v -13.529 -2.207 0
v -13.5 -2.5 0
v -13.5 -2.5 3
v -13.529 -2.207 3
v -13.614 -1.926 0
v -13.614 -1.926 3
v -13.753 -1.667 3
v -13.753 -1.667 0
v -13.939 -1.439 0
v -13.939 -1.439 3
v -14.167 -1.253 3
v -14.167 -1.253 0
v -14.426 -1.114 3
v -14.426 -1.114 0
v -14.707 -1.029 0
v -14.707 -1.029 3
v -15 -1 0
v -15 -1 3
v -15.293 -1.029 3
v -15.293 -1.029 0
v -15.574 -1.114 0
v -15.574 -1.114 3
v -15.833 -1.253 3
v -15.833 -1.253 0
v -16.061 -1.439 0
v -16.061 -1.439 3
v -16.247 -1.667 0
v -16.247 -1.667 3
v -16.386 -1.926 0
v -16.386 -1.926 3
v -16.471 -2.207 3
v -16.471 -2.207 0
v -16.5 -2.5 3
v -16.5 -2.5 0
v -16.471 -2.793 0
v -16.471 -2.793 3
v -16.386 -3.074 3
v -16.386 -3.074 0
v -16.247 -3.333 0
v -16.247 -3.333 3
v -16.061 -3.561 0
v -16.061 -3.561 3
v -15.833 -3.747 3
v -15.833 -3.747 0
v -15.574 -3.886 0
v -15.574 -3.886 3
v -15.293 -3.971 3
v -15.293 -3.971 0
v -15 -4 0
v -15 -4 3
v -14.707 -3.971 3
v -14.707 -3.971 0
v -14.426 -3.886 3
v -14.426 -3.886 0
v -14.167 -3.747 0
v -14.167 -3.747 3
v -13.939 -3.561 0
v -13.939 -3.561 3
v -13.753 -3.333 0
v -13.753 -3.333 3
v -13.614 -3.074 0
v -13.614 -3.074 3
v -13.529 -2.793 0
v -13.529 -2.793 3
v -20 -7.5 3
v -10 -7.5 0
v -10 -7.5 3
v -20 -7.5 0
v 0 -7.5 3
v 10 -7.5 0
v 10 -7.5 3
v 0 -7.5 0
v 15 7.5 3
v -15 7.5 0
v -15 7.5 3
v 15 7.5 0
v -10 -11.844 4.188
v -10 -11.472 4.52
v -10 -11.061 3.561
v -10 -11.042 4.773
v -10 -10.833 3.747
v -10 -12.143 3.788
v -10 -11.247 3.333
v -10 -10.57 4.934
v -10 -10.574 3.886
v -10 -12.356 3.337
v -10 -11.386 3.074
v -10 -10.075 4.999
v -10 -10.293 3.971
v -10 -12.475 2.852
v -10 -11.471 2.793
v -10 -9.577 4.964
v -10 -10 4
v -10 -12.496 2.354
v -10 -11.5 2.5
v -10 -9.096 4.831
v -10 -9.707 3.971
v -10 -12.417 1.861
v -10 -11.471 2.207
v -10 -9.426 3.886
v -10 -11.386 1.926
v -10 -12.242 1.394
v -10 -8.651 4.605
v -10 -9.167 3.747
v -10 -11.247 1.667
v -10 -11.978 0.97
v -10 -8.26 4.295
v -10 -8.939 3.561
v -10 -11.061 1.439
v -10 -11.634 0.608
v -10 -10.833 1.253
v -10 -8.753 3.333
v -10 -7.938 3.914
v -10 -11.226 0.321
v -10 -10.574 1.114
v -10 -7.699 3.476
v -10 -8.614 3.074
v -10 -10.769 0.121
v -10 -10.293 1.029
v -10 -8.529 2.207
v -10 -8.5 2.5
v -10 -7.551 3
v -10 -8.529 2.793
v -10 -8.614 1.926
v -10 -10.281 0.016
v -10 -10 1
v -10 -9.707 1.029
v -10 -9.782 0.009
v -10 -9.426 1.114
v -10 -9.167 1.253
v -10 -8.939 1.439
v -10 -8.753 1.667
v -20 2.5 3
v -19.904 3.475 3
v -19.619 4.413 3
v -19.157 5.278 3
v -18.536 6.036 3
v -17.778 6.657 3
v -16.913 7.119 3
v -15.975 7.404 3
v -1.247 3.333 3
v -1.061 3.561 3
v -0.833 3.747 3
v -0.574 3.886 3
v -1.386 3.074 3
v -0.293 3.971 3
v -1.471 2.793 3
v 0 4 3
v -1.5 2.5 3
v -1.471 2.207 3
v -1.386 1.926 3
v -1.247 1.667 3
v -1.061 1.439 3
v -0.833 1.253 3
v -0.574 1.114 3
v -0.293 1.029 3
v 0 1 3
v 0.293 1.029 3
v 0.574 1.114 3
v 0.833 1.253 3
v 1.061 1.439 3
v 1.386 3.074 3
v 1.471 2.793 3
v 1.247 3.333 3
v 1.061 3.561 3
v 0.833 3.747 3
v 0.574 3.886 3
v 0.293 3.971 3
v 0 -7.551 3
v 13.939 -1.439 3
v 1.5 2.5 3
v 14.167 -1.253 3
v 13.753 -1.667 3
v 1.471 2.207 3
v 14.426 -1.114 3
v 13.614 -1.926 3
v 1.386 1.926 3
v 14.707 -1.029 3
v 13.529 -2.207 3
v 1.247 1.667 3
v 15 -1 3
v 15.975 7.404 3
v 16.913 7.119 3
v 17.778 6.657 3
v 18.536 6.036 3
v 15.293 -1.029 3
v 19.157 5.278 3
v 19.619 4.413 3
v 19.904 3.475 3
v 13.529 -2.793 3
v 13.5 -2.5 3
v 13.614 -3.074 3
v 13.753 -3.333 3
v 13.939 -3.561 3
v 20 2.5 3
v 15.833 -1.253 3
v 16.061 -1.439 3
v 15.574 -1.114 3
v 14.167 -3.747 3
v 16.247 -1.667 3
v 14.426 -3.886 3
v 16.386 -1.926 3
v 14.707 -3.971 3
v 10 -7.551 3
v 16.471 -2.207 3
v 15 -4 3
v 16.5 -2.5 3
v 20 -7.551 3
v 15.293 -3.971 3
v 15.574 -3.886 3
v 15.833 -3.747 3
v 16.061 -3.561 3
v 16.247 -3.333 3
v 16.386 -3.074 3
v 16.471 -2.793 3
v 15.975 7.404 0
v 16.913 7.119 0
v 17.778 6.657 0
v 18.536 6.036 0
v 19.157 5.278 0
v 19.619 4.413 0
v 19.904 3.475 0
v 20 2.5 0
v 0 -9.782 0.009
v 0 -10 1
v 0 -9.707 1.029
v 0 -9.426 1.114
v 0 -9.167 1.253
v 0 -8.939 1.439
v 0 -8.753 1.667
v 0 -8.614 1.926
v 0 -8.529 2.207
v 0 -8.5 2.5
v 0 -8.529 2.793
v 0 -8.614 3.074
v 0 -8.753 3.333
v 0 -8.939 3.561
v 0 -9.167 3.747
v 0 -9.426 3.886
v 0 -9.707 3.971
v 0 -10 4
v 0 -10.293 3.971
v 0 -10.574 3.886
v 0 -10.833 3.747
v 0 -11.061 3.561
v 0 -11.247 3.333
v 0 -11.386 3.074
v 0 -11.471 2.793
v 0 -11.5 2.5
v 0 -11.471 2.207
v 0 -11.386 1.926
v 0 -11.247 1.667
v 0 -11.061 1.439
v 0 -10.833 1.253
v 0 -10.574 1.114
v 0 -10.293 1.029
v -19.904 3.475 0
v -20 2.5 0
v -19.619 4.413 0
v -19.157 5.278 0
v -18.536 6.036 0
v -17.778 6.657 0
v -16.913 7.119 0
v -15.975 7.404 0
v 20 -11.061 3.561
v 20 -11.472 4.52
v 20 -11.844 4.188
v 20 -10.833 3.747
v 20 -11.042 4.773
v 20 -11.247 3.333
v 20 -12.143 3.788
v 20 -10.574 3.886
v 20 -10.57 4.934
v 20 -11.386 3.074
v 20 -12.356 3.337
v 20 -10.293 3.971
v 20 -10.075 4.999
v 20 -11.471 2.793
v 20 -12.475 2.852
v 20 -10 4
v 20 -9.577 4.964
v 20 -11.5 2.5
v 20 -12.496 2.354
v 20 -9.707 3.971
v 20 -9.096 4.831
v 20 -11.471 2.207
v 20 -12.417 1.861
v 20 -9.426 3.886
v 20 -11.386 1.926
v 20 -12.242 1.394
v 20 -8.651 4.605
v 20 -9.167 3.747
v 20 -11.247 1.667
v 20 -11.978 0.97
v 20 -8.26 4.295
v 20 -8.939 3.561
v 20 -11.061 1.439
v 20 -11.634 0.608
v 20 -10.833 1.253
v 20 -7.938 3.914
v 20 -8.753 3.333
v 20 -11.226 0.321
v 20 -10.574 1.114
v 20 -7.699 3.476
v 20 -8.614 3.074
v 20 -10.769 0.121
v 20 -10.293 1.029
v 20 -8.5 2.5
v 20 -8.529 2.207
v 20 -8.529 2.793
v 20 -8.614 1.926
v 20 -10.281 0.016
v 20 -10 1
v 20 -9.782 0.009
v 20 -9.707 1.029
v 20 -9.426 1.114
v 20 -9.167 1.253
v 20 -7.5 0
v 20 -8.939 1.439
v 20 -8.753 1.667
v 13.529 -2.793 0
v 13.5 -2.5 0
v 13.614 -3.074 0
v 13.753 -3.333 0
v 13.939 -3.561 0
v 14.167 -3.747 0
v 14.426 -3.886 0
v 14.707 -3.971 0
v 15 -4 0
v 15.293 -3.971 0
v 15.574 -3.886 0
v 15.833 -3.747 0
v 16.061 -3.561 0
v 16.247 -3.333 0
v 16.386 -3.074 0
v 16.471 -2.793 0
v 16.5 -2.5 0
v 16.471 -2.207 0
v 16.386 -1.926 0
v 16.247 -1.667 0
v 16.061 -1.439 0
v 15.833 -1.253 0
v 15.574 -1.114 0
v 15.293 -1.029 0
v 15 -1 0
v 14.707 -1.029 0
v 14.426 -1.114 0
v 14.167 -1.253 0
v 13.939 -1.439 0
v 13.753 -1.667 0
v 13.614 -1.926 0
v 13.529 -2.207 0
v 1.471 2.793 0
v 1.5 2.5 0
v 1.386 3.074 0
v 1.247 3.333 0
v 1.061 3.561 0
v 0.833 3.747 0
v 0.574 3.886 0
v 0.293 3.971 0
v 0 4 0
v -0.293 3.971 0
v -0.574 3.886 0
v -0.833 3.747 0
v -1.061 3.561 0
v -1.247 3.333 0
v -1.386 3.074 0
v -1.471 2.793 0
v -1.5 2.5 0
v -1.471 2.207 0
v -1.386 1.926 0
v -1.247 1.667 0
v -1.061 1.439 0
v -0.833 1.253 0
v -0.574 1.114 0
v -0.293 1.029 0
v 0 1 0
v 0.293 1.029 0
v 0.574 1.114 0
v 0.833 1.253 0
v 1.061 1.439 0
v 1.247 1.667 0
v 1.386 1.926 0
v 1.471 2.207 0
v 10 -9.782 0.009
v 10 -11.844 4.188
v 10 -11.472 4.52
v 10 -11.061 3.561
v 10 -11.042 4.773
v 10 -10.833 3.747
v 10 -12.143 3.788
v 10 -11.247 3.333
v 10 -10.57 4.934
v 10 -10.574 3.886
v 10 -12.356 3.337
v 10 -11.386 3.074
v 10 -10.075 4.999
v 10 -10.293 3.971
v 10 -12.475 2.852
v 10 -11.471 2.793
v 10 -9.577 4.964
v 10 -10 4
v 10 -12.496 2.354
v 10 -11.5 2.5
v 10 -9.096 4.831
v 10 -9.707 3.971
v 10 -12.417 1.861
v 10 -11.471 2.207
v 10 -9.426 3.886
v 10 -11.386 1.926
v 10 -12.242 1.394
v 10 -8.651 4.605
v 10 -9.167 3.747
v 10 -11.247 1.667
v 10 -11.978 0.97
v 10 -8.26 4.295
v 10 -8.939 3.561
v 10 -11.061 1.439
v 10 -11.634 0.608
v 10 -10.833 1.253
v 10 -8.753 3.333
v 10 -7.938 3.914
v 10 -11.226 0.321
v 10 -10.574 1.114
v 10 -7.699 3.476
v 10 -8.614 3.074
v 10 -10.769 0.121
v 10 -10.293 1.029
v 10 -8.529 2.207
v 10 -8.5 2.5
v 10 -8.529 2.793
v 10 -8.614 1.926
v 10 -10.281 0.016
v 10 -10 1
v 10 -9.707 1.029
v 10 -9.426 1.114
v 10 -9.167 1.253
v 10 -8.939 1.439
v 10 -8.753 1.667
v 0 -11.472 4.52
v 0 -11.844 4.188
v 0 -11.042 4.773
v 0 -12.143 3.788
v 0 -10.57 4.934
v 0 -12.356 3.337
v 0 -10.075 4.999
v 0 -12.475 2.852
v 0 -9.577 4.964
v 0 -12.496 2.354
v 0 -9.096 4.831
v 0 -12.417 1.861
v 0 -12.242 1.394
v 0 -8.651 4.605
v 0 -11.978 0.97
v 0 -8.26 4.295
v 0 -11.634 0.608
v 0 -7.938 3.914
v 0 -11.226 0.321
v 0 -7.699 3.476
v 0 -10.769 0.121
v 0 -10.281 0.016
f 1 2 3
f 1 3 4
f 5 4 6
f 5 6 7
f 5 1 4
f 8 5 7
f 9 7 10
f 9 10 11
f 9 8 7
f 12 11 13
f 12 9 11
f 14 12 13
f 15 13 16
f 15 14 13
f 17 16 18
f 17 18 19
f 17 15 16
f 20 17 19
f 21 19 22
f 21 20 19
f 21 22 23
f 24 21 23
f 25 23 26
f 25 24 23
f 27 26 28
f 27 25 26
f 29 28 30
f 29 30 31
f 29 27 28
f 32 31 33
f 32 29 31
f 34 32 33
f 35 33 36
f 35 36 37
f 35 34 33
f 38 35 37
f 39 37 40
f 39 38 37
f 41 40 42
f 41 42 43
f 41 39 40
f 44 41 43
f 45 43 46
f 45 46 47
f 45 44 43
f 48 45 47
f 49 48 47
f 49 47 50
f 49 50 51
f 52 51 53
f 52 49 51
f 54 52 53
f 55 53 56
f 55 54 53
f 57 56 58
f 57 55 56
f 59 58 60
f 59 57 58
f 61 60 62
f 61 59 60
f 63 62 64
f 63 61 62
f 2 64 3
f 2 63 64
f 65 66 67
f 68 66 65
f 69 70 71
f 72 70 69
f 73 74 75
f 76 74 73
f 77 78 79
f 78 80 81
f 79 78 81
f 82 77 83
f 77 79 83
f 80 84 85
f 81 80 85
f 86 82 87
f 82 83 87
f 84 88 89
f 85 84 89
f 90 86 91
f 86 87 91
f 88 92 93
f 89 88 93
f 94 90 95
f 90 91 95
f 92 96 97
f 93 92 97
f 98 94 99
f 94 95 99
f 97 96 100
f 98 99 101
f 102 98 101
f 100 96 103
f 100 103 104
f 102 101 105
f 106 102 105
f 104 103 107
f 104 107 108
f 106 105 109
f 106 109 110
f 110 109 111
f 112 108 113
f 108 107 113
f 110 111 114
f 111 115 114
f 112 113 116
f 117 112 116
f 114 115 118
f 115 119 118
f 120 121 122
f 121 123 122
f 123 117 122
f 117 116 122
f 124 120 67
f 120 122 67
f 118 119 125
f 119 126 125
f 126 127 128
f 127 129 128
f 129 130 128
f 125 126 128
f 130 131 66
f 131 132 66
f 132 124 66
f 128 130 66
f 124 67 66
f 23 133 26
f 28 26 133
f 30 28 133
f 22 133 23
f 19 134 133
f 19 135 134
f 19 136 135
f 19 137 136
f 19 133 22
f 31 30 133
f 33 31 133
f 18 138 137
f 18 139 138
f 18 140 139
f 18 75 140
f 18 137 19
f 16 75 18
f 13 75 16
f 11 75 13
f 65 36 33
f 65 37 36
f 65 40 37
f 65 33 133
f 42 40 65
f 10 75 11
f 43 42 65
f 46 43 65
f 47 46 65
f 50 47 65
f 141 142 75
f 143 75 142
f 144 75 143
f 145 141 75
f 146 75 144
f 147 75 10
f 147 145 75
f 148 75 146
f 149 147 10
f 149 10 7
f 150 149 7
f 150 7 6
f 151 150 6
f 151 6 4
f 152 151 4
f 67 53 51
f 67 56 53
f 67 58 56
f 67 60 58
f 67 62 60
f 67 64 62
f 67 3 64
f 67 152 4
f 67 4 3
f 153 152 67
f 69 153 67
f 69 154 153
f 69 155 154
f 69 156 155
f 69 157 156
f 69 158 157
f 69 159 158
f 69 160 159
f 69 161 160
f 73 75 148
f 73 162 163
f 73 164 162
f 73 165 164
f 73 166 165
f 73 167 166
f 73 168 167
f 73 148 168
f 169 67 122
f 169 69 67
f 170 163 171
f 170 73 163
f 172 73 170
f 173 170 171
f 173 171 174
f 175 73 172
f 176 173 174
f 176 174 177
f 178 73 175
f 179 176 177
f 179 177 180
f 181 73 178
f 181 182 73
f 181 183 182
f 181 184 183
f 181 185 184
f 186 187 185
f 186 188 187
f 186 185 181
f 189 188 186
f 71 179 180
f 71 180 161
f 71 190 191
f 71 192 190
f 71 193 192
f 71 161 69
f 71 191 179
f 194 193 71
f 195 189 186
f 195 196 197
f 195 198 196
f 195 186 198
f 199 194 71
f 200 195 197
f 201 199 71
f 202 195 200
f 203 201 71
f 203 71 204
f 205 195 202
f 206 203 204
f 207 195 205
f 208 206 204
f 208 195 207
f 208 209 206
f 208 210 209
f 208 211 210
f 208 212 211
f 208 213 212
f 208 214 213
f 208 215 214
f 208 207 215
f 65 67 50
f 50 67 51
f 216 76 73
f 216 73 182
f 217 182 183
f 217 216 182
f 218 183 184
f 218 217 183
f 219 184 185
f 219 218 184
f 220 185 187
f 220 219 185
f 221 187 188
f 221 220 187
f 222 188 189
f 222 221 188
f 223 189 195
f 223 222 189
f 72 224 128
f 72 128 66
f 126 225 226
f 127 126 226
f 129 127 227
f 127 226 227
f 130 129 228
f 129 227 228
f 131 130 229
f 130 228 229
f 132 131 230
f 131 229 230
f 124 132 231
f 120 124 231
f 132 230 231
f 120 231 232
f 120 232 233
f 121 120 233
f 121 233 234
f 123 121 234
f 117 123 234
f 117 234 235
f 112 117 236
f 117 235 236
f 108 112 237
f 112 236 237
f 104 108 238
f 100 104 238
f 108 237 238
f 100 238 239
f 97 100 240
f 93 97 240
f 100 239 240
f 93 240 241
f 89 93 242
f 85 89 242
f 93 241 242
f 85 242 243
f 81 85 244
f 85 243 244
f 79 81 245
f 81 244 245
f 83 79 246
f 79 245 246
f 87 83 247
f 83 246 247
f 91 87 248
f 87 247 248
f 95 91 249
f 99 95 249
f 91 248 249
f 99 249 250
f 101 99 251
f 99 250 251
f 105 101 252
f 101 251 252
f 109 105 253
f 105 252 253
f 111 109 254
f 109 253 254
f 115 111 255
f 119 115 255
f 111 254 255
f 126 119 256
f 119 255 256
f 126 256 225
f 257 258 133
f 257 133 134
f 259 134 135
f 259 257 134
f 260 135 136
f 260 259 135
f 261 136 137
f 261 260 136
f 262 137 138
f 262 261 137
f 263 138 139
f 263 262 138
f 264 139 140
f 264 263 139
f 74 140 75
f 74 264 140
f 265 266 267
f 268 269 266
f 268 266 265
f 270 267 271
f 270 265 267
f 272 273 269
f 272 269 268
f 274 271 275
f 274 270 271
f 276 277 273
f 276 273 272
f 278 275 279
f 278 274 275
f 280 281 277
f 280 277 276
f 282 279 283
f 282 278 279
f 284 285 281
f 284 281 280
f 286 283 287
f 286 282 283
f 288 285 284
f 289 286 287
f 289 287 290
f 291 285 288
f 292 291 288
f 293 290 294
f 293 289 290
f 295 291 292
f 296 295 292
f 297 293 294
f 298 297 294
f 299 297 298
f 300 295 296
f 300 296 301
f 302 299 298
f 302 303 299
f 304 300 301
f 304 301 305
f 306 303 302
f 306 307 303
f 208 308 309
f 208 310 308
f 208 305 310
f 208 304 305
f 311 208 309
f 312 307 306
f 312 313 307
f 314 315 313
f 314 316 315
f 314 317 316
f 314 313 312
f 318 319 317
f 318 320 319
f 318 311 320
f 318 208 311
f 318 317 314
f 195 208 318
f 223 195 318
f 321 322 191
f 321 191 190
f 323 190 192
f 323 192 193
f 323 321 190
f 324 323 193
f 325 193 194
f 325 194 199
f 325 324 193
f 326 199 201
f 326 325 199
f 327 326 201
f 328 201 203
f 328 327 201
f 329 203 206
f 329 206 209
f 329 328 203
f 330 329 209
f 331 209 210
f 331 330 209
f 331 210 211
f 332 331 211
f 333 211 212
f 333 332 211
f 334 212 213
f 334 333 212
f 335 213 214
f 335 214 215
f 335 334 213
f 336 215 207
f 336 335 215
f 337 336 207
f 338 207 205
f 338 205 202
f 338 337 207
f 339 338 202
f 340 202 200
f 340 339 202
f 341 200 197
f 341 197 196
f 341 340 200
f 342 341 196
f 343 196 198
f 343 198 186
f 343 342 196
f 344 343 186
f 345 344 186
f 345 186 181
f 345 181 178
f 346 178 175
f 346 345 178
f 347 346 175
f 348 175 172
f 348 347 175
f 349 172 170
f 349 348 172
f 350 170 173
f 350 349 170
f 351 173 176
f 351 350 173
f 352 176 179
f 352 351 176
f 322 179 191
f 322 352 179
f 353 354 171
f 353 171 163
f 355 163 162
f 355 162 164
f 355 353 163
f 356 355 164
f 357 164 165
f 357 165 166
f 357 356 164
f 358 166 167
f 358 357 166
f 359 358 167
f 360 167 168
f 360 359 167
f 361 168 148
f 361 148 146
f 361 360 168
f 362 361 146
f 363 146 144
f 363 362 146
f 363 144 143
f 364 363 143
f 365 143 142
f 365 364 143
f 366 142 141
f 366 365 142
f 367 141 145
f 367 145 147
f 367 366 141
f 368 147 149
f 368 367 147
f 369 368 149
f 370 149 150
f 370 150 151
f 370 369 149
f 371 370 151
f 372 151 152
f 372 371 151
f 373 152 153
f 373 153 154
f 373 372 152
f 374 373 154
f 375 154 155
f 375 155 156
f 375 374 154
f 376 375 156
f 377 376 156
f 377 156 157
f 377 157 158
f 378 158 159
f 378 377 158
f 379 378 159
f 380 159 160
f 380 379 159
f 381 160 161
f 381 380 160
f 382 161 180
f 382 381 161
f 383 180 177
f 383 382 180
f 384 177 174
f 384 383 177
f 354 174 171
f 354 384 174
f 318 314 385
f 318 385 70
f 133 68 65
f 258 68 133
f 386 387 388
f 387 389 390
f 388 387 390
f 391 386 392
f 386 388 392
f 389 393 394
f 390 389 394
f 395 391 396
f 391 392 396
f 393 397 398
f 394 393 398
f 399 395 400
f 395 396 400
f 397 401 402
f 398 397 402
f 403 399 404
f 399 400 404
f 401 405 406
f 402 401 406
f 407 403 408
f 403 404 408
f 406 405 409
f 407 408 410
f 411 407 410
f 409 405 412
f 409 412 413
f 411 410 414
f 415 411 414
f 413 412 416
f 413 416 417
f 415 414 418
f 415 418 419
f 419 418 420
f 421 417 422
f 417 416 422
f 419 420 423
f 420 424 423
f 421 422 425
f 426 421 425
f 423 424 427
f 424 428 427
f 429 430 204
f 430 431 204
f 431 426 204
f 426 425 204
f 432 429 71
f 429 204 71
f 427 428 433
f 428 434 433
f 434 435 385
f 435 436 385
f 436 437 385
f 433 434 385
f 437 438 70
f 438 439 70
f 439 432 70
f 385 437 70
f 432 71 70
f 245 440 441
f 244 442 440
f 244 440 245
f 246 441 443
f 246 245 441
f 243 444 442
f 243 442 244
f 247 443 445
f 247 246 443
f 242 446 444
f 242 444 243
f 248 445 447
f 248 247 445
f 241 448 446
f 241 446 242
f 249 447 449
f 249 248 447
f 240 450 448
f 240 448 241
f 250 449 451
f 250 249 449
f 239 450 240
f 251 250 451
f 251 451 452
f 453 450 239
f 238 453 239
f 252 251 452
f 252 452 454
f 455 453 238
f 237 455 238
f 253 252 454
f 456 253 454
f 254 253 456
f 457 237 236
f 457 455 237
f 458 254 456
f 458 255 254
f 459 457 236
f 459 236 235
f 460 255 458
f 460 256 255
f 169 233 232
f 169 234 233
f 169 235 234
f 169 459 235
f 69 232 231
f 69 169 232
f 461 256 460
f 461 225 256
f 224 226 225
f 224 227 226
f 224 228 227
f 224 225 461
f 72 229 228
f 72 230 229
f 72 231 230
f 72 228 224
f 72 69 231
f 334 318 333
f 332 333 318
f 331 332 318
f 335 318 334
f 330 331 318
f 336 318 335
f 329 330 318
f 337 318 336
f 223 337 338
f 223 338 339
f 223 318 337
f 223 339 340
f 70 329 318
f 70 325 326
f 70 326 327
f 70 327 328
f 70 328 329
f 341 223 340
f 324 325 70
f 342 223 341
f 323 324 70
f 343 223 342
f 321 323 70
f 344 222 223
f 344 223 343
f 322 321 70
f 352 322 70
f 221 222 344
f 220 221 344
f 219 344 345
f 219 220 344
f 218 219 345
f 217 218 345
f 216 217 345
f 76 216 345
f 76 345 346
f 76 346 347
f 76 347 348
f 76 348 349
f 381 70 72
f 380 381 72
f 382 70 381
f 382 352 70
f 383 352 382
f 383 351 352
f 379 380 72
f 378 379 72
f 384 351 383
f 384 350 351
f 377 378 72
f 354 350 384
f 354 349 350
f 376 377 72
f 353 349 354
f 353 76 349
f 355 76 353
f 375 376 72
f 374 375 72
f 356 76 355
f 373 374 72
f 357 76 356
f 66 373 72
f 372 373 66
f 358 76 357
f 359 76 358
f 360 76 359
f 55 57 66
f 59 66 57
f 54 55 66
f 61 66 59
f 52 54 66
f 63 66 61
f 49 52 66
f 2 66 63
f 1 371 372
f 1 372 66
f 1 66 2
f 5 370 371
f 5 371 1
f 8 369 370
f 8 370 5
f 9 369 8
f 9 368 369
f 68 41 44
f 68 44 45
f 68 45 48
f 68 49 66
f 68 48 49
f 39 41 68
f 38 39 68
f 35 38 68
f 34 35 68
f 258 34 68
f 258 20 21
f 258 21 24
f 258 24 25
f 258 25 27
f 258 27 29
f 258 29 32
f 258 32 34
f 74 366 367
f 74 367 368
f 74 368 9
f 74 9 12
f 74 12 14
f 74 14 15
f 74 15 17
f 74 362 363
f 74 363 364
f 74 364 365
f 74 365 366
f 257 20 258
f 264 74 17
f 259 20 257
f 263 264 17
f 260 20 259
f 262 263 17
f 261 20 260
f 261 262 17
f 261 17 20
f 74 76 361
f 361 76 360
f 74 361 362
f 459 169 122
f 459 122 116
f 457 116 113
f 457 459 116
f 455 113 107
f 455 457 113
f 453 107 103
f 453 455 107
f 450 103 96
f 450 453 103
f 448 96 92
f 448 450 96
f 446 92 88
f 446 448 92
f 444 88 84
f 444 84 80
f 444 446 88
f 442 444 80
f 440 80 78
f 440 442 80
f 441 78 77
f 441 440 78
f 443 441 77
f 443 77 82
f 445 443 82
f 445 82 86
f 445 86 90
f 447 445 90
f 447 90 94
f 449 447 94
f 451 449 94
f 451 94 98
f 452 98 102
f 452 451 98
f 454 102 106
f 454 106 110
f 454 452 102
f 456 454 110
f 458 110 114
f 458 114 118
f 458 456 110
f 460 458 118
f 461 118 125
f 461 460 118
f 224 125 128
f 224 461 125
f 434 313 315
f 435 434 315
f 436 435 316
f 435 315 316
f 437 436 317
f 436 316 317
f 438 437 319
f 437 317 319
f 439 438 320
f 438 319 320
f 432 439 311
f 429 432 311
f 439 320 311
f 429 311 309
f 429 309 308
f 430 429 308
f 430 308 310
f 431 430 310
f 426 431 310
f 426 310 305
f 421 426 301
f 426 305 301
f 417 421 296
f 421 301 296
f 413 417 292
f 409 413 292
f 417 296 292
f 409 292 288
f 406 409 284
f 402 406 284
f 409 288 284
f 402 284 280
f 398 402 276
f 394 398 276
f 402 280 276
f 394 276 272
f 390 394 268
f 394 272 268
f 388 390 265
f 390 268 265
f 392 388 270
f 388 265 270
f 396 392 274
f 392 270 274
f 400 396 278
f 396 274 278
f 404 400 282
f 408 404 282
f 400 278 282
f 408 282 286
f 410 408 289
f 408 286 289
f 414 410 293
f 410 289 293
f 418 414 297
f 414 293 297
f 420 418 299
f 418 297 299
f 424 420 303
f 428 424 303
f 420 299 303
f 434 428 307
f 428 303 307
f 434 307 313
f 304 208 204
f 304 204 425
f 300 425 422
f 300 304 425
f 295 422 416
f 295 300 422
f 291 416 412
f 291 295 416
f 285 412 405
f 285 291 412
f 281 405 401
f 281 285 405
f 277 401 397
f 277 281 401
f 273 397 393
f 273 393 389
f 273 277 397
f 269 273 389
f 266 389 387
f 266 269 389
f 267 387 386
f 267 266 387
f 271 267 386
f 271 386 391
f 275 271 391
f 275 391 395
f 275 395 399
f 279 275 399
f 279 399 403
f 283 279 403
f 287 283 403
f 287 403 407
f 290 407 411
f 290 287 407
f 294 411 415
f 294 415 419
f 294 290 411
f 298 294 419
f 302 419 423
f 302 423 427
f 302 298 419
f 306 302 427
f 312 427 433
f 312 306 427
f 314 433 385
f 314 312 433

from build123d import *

# Parameters (mm, degrees)
ESQUISSE1_R                = 1.5
BOSS_EXTRU_1_DEPTH         = 3
ESQUISSE2_R                = 1.5
BOSS_EXTRU_2_DEPTH         = 10
R_P_TITION_LIN_AIRE1_COUNT = 2
R_P_TITION_LIN_AIRE1_PITCH = 20


with BuildPart() as part:
    # Esquisse1 → Boss.-Extru.1 (new body)
    with BuildSketch(Plane.XY):
        with BuildLine():
            Line((-15, 7.5), (15, 7.5))
            ThreePointArc((15, 7.5), (18.535533906, 6.035533906), (20, 2.5))
            Line((20, 2.5), (20, -7.5))
            Line((20, -7.5), (-20, -7.5))
            Line((-20, -7.5), (-20, 2.5))
            ThreePointArc((-20, 2.5), (-18.535533906, 6.035533906), (-15, 7.5))
        make_face()
        with Locations((-15, -2.5)):
            Circle(ESQUISSE1_R, mode=Mode.SUBTRACT)
        with Locations(Location((15, -2.5, 0), (0, 0, 180))):
            Circle(ESQUISSE1_R, mode=Mode.SUBTRACT)
        with Locations((0, 2.5)):
            Circle(ESQUISSE1_R, mode=Mode.SUBTRACT)
    extrude(amount=BOSS_EXTRU_1_DEPTH)

    # Esquisse2 → Boss.-Extru.2 (add)
    with BuildSketch(Plane(origin=(20, 0, 0), x_dir=(0, 0, -1), z_dir=(1, 0, 0))):
        with BuildLine():
            Line((-0.009486275, -9.782419246), (0, -7.5))
            Line((0, -7.5), (-2.5, -7.5))
            Line((-2.5, -7.5), (-3, -7.5))
            Line((-3, -7.5), (-3, -7.550510257))
            ThreePointArc((-3, -7.550510257), (-3.995289489, -12.003524231), (-0.009486275, -9.782419246))
        make_face()
        with Locations((-2.5, -10)):
            Circle(ESQUISSE2_R, mode=Mode.SUBTRACT)
    boss_extru_2 = extrude(amount=-BOSS_EXTRU_2_DEPTH)

    # Répétition linéaire1: Boss.-Extru.2 ×2
    with Locations(*[(-i * R_P_TITION_LIN_AIRE1_PITCH, 0, 0) for i in range(1, R_P_TITION_LIN_AIRE1_COUNT)]):
        add(boss_extru_2)


solid = part.part
